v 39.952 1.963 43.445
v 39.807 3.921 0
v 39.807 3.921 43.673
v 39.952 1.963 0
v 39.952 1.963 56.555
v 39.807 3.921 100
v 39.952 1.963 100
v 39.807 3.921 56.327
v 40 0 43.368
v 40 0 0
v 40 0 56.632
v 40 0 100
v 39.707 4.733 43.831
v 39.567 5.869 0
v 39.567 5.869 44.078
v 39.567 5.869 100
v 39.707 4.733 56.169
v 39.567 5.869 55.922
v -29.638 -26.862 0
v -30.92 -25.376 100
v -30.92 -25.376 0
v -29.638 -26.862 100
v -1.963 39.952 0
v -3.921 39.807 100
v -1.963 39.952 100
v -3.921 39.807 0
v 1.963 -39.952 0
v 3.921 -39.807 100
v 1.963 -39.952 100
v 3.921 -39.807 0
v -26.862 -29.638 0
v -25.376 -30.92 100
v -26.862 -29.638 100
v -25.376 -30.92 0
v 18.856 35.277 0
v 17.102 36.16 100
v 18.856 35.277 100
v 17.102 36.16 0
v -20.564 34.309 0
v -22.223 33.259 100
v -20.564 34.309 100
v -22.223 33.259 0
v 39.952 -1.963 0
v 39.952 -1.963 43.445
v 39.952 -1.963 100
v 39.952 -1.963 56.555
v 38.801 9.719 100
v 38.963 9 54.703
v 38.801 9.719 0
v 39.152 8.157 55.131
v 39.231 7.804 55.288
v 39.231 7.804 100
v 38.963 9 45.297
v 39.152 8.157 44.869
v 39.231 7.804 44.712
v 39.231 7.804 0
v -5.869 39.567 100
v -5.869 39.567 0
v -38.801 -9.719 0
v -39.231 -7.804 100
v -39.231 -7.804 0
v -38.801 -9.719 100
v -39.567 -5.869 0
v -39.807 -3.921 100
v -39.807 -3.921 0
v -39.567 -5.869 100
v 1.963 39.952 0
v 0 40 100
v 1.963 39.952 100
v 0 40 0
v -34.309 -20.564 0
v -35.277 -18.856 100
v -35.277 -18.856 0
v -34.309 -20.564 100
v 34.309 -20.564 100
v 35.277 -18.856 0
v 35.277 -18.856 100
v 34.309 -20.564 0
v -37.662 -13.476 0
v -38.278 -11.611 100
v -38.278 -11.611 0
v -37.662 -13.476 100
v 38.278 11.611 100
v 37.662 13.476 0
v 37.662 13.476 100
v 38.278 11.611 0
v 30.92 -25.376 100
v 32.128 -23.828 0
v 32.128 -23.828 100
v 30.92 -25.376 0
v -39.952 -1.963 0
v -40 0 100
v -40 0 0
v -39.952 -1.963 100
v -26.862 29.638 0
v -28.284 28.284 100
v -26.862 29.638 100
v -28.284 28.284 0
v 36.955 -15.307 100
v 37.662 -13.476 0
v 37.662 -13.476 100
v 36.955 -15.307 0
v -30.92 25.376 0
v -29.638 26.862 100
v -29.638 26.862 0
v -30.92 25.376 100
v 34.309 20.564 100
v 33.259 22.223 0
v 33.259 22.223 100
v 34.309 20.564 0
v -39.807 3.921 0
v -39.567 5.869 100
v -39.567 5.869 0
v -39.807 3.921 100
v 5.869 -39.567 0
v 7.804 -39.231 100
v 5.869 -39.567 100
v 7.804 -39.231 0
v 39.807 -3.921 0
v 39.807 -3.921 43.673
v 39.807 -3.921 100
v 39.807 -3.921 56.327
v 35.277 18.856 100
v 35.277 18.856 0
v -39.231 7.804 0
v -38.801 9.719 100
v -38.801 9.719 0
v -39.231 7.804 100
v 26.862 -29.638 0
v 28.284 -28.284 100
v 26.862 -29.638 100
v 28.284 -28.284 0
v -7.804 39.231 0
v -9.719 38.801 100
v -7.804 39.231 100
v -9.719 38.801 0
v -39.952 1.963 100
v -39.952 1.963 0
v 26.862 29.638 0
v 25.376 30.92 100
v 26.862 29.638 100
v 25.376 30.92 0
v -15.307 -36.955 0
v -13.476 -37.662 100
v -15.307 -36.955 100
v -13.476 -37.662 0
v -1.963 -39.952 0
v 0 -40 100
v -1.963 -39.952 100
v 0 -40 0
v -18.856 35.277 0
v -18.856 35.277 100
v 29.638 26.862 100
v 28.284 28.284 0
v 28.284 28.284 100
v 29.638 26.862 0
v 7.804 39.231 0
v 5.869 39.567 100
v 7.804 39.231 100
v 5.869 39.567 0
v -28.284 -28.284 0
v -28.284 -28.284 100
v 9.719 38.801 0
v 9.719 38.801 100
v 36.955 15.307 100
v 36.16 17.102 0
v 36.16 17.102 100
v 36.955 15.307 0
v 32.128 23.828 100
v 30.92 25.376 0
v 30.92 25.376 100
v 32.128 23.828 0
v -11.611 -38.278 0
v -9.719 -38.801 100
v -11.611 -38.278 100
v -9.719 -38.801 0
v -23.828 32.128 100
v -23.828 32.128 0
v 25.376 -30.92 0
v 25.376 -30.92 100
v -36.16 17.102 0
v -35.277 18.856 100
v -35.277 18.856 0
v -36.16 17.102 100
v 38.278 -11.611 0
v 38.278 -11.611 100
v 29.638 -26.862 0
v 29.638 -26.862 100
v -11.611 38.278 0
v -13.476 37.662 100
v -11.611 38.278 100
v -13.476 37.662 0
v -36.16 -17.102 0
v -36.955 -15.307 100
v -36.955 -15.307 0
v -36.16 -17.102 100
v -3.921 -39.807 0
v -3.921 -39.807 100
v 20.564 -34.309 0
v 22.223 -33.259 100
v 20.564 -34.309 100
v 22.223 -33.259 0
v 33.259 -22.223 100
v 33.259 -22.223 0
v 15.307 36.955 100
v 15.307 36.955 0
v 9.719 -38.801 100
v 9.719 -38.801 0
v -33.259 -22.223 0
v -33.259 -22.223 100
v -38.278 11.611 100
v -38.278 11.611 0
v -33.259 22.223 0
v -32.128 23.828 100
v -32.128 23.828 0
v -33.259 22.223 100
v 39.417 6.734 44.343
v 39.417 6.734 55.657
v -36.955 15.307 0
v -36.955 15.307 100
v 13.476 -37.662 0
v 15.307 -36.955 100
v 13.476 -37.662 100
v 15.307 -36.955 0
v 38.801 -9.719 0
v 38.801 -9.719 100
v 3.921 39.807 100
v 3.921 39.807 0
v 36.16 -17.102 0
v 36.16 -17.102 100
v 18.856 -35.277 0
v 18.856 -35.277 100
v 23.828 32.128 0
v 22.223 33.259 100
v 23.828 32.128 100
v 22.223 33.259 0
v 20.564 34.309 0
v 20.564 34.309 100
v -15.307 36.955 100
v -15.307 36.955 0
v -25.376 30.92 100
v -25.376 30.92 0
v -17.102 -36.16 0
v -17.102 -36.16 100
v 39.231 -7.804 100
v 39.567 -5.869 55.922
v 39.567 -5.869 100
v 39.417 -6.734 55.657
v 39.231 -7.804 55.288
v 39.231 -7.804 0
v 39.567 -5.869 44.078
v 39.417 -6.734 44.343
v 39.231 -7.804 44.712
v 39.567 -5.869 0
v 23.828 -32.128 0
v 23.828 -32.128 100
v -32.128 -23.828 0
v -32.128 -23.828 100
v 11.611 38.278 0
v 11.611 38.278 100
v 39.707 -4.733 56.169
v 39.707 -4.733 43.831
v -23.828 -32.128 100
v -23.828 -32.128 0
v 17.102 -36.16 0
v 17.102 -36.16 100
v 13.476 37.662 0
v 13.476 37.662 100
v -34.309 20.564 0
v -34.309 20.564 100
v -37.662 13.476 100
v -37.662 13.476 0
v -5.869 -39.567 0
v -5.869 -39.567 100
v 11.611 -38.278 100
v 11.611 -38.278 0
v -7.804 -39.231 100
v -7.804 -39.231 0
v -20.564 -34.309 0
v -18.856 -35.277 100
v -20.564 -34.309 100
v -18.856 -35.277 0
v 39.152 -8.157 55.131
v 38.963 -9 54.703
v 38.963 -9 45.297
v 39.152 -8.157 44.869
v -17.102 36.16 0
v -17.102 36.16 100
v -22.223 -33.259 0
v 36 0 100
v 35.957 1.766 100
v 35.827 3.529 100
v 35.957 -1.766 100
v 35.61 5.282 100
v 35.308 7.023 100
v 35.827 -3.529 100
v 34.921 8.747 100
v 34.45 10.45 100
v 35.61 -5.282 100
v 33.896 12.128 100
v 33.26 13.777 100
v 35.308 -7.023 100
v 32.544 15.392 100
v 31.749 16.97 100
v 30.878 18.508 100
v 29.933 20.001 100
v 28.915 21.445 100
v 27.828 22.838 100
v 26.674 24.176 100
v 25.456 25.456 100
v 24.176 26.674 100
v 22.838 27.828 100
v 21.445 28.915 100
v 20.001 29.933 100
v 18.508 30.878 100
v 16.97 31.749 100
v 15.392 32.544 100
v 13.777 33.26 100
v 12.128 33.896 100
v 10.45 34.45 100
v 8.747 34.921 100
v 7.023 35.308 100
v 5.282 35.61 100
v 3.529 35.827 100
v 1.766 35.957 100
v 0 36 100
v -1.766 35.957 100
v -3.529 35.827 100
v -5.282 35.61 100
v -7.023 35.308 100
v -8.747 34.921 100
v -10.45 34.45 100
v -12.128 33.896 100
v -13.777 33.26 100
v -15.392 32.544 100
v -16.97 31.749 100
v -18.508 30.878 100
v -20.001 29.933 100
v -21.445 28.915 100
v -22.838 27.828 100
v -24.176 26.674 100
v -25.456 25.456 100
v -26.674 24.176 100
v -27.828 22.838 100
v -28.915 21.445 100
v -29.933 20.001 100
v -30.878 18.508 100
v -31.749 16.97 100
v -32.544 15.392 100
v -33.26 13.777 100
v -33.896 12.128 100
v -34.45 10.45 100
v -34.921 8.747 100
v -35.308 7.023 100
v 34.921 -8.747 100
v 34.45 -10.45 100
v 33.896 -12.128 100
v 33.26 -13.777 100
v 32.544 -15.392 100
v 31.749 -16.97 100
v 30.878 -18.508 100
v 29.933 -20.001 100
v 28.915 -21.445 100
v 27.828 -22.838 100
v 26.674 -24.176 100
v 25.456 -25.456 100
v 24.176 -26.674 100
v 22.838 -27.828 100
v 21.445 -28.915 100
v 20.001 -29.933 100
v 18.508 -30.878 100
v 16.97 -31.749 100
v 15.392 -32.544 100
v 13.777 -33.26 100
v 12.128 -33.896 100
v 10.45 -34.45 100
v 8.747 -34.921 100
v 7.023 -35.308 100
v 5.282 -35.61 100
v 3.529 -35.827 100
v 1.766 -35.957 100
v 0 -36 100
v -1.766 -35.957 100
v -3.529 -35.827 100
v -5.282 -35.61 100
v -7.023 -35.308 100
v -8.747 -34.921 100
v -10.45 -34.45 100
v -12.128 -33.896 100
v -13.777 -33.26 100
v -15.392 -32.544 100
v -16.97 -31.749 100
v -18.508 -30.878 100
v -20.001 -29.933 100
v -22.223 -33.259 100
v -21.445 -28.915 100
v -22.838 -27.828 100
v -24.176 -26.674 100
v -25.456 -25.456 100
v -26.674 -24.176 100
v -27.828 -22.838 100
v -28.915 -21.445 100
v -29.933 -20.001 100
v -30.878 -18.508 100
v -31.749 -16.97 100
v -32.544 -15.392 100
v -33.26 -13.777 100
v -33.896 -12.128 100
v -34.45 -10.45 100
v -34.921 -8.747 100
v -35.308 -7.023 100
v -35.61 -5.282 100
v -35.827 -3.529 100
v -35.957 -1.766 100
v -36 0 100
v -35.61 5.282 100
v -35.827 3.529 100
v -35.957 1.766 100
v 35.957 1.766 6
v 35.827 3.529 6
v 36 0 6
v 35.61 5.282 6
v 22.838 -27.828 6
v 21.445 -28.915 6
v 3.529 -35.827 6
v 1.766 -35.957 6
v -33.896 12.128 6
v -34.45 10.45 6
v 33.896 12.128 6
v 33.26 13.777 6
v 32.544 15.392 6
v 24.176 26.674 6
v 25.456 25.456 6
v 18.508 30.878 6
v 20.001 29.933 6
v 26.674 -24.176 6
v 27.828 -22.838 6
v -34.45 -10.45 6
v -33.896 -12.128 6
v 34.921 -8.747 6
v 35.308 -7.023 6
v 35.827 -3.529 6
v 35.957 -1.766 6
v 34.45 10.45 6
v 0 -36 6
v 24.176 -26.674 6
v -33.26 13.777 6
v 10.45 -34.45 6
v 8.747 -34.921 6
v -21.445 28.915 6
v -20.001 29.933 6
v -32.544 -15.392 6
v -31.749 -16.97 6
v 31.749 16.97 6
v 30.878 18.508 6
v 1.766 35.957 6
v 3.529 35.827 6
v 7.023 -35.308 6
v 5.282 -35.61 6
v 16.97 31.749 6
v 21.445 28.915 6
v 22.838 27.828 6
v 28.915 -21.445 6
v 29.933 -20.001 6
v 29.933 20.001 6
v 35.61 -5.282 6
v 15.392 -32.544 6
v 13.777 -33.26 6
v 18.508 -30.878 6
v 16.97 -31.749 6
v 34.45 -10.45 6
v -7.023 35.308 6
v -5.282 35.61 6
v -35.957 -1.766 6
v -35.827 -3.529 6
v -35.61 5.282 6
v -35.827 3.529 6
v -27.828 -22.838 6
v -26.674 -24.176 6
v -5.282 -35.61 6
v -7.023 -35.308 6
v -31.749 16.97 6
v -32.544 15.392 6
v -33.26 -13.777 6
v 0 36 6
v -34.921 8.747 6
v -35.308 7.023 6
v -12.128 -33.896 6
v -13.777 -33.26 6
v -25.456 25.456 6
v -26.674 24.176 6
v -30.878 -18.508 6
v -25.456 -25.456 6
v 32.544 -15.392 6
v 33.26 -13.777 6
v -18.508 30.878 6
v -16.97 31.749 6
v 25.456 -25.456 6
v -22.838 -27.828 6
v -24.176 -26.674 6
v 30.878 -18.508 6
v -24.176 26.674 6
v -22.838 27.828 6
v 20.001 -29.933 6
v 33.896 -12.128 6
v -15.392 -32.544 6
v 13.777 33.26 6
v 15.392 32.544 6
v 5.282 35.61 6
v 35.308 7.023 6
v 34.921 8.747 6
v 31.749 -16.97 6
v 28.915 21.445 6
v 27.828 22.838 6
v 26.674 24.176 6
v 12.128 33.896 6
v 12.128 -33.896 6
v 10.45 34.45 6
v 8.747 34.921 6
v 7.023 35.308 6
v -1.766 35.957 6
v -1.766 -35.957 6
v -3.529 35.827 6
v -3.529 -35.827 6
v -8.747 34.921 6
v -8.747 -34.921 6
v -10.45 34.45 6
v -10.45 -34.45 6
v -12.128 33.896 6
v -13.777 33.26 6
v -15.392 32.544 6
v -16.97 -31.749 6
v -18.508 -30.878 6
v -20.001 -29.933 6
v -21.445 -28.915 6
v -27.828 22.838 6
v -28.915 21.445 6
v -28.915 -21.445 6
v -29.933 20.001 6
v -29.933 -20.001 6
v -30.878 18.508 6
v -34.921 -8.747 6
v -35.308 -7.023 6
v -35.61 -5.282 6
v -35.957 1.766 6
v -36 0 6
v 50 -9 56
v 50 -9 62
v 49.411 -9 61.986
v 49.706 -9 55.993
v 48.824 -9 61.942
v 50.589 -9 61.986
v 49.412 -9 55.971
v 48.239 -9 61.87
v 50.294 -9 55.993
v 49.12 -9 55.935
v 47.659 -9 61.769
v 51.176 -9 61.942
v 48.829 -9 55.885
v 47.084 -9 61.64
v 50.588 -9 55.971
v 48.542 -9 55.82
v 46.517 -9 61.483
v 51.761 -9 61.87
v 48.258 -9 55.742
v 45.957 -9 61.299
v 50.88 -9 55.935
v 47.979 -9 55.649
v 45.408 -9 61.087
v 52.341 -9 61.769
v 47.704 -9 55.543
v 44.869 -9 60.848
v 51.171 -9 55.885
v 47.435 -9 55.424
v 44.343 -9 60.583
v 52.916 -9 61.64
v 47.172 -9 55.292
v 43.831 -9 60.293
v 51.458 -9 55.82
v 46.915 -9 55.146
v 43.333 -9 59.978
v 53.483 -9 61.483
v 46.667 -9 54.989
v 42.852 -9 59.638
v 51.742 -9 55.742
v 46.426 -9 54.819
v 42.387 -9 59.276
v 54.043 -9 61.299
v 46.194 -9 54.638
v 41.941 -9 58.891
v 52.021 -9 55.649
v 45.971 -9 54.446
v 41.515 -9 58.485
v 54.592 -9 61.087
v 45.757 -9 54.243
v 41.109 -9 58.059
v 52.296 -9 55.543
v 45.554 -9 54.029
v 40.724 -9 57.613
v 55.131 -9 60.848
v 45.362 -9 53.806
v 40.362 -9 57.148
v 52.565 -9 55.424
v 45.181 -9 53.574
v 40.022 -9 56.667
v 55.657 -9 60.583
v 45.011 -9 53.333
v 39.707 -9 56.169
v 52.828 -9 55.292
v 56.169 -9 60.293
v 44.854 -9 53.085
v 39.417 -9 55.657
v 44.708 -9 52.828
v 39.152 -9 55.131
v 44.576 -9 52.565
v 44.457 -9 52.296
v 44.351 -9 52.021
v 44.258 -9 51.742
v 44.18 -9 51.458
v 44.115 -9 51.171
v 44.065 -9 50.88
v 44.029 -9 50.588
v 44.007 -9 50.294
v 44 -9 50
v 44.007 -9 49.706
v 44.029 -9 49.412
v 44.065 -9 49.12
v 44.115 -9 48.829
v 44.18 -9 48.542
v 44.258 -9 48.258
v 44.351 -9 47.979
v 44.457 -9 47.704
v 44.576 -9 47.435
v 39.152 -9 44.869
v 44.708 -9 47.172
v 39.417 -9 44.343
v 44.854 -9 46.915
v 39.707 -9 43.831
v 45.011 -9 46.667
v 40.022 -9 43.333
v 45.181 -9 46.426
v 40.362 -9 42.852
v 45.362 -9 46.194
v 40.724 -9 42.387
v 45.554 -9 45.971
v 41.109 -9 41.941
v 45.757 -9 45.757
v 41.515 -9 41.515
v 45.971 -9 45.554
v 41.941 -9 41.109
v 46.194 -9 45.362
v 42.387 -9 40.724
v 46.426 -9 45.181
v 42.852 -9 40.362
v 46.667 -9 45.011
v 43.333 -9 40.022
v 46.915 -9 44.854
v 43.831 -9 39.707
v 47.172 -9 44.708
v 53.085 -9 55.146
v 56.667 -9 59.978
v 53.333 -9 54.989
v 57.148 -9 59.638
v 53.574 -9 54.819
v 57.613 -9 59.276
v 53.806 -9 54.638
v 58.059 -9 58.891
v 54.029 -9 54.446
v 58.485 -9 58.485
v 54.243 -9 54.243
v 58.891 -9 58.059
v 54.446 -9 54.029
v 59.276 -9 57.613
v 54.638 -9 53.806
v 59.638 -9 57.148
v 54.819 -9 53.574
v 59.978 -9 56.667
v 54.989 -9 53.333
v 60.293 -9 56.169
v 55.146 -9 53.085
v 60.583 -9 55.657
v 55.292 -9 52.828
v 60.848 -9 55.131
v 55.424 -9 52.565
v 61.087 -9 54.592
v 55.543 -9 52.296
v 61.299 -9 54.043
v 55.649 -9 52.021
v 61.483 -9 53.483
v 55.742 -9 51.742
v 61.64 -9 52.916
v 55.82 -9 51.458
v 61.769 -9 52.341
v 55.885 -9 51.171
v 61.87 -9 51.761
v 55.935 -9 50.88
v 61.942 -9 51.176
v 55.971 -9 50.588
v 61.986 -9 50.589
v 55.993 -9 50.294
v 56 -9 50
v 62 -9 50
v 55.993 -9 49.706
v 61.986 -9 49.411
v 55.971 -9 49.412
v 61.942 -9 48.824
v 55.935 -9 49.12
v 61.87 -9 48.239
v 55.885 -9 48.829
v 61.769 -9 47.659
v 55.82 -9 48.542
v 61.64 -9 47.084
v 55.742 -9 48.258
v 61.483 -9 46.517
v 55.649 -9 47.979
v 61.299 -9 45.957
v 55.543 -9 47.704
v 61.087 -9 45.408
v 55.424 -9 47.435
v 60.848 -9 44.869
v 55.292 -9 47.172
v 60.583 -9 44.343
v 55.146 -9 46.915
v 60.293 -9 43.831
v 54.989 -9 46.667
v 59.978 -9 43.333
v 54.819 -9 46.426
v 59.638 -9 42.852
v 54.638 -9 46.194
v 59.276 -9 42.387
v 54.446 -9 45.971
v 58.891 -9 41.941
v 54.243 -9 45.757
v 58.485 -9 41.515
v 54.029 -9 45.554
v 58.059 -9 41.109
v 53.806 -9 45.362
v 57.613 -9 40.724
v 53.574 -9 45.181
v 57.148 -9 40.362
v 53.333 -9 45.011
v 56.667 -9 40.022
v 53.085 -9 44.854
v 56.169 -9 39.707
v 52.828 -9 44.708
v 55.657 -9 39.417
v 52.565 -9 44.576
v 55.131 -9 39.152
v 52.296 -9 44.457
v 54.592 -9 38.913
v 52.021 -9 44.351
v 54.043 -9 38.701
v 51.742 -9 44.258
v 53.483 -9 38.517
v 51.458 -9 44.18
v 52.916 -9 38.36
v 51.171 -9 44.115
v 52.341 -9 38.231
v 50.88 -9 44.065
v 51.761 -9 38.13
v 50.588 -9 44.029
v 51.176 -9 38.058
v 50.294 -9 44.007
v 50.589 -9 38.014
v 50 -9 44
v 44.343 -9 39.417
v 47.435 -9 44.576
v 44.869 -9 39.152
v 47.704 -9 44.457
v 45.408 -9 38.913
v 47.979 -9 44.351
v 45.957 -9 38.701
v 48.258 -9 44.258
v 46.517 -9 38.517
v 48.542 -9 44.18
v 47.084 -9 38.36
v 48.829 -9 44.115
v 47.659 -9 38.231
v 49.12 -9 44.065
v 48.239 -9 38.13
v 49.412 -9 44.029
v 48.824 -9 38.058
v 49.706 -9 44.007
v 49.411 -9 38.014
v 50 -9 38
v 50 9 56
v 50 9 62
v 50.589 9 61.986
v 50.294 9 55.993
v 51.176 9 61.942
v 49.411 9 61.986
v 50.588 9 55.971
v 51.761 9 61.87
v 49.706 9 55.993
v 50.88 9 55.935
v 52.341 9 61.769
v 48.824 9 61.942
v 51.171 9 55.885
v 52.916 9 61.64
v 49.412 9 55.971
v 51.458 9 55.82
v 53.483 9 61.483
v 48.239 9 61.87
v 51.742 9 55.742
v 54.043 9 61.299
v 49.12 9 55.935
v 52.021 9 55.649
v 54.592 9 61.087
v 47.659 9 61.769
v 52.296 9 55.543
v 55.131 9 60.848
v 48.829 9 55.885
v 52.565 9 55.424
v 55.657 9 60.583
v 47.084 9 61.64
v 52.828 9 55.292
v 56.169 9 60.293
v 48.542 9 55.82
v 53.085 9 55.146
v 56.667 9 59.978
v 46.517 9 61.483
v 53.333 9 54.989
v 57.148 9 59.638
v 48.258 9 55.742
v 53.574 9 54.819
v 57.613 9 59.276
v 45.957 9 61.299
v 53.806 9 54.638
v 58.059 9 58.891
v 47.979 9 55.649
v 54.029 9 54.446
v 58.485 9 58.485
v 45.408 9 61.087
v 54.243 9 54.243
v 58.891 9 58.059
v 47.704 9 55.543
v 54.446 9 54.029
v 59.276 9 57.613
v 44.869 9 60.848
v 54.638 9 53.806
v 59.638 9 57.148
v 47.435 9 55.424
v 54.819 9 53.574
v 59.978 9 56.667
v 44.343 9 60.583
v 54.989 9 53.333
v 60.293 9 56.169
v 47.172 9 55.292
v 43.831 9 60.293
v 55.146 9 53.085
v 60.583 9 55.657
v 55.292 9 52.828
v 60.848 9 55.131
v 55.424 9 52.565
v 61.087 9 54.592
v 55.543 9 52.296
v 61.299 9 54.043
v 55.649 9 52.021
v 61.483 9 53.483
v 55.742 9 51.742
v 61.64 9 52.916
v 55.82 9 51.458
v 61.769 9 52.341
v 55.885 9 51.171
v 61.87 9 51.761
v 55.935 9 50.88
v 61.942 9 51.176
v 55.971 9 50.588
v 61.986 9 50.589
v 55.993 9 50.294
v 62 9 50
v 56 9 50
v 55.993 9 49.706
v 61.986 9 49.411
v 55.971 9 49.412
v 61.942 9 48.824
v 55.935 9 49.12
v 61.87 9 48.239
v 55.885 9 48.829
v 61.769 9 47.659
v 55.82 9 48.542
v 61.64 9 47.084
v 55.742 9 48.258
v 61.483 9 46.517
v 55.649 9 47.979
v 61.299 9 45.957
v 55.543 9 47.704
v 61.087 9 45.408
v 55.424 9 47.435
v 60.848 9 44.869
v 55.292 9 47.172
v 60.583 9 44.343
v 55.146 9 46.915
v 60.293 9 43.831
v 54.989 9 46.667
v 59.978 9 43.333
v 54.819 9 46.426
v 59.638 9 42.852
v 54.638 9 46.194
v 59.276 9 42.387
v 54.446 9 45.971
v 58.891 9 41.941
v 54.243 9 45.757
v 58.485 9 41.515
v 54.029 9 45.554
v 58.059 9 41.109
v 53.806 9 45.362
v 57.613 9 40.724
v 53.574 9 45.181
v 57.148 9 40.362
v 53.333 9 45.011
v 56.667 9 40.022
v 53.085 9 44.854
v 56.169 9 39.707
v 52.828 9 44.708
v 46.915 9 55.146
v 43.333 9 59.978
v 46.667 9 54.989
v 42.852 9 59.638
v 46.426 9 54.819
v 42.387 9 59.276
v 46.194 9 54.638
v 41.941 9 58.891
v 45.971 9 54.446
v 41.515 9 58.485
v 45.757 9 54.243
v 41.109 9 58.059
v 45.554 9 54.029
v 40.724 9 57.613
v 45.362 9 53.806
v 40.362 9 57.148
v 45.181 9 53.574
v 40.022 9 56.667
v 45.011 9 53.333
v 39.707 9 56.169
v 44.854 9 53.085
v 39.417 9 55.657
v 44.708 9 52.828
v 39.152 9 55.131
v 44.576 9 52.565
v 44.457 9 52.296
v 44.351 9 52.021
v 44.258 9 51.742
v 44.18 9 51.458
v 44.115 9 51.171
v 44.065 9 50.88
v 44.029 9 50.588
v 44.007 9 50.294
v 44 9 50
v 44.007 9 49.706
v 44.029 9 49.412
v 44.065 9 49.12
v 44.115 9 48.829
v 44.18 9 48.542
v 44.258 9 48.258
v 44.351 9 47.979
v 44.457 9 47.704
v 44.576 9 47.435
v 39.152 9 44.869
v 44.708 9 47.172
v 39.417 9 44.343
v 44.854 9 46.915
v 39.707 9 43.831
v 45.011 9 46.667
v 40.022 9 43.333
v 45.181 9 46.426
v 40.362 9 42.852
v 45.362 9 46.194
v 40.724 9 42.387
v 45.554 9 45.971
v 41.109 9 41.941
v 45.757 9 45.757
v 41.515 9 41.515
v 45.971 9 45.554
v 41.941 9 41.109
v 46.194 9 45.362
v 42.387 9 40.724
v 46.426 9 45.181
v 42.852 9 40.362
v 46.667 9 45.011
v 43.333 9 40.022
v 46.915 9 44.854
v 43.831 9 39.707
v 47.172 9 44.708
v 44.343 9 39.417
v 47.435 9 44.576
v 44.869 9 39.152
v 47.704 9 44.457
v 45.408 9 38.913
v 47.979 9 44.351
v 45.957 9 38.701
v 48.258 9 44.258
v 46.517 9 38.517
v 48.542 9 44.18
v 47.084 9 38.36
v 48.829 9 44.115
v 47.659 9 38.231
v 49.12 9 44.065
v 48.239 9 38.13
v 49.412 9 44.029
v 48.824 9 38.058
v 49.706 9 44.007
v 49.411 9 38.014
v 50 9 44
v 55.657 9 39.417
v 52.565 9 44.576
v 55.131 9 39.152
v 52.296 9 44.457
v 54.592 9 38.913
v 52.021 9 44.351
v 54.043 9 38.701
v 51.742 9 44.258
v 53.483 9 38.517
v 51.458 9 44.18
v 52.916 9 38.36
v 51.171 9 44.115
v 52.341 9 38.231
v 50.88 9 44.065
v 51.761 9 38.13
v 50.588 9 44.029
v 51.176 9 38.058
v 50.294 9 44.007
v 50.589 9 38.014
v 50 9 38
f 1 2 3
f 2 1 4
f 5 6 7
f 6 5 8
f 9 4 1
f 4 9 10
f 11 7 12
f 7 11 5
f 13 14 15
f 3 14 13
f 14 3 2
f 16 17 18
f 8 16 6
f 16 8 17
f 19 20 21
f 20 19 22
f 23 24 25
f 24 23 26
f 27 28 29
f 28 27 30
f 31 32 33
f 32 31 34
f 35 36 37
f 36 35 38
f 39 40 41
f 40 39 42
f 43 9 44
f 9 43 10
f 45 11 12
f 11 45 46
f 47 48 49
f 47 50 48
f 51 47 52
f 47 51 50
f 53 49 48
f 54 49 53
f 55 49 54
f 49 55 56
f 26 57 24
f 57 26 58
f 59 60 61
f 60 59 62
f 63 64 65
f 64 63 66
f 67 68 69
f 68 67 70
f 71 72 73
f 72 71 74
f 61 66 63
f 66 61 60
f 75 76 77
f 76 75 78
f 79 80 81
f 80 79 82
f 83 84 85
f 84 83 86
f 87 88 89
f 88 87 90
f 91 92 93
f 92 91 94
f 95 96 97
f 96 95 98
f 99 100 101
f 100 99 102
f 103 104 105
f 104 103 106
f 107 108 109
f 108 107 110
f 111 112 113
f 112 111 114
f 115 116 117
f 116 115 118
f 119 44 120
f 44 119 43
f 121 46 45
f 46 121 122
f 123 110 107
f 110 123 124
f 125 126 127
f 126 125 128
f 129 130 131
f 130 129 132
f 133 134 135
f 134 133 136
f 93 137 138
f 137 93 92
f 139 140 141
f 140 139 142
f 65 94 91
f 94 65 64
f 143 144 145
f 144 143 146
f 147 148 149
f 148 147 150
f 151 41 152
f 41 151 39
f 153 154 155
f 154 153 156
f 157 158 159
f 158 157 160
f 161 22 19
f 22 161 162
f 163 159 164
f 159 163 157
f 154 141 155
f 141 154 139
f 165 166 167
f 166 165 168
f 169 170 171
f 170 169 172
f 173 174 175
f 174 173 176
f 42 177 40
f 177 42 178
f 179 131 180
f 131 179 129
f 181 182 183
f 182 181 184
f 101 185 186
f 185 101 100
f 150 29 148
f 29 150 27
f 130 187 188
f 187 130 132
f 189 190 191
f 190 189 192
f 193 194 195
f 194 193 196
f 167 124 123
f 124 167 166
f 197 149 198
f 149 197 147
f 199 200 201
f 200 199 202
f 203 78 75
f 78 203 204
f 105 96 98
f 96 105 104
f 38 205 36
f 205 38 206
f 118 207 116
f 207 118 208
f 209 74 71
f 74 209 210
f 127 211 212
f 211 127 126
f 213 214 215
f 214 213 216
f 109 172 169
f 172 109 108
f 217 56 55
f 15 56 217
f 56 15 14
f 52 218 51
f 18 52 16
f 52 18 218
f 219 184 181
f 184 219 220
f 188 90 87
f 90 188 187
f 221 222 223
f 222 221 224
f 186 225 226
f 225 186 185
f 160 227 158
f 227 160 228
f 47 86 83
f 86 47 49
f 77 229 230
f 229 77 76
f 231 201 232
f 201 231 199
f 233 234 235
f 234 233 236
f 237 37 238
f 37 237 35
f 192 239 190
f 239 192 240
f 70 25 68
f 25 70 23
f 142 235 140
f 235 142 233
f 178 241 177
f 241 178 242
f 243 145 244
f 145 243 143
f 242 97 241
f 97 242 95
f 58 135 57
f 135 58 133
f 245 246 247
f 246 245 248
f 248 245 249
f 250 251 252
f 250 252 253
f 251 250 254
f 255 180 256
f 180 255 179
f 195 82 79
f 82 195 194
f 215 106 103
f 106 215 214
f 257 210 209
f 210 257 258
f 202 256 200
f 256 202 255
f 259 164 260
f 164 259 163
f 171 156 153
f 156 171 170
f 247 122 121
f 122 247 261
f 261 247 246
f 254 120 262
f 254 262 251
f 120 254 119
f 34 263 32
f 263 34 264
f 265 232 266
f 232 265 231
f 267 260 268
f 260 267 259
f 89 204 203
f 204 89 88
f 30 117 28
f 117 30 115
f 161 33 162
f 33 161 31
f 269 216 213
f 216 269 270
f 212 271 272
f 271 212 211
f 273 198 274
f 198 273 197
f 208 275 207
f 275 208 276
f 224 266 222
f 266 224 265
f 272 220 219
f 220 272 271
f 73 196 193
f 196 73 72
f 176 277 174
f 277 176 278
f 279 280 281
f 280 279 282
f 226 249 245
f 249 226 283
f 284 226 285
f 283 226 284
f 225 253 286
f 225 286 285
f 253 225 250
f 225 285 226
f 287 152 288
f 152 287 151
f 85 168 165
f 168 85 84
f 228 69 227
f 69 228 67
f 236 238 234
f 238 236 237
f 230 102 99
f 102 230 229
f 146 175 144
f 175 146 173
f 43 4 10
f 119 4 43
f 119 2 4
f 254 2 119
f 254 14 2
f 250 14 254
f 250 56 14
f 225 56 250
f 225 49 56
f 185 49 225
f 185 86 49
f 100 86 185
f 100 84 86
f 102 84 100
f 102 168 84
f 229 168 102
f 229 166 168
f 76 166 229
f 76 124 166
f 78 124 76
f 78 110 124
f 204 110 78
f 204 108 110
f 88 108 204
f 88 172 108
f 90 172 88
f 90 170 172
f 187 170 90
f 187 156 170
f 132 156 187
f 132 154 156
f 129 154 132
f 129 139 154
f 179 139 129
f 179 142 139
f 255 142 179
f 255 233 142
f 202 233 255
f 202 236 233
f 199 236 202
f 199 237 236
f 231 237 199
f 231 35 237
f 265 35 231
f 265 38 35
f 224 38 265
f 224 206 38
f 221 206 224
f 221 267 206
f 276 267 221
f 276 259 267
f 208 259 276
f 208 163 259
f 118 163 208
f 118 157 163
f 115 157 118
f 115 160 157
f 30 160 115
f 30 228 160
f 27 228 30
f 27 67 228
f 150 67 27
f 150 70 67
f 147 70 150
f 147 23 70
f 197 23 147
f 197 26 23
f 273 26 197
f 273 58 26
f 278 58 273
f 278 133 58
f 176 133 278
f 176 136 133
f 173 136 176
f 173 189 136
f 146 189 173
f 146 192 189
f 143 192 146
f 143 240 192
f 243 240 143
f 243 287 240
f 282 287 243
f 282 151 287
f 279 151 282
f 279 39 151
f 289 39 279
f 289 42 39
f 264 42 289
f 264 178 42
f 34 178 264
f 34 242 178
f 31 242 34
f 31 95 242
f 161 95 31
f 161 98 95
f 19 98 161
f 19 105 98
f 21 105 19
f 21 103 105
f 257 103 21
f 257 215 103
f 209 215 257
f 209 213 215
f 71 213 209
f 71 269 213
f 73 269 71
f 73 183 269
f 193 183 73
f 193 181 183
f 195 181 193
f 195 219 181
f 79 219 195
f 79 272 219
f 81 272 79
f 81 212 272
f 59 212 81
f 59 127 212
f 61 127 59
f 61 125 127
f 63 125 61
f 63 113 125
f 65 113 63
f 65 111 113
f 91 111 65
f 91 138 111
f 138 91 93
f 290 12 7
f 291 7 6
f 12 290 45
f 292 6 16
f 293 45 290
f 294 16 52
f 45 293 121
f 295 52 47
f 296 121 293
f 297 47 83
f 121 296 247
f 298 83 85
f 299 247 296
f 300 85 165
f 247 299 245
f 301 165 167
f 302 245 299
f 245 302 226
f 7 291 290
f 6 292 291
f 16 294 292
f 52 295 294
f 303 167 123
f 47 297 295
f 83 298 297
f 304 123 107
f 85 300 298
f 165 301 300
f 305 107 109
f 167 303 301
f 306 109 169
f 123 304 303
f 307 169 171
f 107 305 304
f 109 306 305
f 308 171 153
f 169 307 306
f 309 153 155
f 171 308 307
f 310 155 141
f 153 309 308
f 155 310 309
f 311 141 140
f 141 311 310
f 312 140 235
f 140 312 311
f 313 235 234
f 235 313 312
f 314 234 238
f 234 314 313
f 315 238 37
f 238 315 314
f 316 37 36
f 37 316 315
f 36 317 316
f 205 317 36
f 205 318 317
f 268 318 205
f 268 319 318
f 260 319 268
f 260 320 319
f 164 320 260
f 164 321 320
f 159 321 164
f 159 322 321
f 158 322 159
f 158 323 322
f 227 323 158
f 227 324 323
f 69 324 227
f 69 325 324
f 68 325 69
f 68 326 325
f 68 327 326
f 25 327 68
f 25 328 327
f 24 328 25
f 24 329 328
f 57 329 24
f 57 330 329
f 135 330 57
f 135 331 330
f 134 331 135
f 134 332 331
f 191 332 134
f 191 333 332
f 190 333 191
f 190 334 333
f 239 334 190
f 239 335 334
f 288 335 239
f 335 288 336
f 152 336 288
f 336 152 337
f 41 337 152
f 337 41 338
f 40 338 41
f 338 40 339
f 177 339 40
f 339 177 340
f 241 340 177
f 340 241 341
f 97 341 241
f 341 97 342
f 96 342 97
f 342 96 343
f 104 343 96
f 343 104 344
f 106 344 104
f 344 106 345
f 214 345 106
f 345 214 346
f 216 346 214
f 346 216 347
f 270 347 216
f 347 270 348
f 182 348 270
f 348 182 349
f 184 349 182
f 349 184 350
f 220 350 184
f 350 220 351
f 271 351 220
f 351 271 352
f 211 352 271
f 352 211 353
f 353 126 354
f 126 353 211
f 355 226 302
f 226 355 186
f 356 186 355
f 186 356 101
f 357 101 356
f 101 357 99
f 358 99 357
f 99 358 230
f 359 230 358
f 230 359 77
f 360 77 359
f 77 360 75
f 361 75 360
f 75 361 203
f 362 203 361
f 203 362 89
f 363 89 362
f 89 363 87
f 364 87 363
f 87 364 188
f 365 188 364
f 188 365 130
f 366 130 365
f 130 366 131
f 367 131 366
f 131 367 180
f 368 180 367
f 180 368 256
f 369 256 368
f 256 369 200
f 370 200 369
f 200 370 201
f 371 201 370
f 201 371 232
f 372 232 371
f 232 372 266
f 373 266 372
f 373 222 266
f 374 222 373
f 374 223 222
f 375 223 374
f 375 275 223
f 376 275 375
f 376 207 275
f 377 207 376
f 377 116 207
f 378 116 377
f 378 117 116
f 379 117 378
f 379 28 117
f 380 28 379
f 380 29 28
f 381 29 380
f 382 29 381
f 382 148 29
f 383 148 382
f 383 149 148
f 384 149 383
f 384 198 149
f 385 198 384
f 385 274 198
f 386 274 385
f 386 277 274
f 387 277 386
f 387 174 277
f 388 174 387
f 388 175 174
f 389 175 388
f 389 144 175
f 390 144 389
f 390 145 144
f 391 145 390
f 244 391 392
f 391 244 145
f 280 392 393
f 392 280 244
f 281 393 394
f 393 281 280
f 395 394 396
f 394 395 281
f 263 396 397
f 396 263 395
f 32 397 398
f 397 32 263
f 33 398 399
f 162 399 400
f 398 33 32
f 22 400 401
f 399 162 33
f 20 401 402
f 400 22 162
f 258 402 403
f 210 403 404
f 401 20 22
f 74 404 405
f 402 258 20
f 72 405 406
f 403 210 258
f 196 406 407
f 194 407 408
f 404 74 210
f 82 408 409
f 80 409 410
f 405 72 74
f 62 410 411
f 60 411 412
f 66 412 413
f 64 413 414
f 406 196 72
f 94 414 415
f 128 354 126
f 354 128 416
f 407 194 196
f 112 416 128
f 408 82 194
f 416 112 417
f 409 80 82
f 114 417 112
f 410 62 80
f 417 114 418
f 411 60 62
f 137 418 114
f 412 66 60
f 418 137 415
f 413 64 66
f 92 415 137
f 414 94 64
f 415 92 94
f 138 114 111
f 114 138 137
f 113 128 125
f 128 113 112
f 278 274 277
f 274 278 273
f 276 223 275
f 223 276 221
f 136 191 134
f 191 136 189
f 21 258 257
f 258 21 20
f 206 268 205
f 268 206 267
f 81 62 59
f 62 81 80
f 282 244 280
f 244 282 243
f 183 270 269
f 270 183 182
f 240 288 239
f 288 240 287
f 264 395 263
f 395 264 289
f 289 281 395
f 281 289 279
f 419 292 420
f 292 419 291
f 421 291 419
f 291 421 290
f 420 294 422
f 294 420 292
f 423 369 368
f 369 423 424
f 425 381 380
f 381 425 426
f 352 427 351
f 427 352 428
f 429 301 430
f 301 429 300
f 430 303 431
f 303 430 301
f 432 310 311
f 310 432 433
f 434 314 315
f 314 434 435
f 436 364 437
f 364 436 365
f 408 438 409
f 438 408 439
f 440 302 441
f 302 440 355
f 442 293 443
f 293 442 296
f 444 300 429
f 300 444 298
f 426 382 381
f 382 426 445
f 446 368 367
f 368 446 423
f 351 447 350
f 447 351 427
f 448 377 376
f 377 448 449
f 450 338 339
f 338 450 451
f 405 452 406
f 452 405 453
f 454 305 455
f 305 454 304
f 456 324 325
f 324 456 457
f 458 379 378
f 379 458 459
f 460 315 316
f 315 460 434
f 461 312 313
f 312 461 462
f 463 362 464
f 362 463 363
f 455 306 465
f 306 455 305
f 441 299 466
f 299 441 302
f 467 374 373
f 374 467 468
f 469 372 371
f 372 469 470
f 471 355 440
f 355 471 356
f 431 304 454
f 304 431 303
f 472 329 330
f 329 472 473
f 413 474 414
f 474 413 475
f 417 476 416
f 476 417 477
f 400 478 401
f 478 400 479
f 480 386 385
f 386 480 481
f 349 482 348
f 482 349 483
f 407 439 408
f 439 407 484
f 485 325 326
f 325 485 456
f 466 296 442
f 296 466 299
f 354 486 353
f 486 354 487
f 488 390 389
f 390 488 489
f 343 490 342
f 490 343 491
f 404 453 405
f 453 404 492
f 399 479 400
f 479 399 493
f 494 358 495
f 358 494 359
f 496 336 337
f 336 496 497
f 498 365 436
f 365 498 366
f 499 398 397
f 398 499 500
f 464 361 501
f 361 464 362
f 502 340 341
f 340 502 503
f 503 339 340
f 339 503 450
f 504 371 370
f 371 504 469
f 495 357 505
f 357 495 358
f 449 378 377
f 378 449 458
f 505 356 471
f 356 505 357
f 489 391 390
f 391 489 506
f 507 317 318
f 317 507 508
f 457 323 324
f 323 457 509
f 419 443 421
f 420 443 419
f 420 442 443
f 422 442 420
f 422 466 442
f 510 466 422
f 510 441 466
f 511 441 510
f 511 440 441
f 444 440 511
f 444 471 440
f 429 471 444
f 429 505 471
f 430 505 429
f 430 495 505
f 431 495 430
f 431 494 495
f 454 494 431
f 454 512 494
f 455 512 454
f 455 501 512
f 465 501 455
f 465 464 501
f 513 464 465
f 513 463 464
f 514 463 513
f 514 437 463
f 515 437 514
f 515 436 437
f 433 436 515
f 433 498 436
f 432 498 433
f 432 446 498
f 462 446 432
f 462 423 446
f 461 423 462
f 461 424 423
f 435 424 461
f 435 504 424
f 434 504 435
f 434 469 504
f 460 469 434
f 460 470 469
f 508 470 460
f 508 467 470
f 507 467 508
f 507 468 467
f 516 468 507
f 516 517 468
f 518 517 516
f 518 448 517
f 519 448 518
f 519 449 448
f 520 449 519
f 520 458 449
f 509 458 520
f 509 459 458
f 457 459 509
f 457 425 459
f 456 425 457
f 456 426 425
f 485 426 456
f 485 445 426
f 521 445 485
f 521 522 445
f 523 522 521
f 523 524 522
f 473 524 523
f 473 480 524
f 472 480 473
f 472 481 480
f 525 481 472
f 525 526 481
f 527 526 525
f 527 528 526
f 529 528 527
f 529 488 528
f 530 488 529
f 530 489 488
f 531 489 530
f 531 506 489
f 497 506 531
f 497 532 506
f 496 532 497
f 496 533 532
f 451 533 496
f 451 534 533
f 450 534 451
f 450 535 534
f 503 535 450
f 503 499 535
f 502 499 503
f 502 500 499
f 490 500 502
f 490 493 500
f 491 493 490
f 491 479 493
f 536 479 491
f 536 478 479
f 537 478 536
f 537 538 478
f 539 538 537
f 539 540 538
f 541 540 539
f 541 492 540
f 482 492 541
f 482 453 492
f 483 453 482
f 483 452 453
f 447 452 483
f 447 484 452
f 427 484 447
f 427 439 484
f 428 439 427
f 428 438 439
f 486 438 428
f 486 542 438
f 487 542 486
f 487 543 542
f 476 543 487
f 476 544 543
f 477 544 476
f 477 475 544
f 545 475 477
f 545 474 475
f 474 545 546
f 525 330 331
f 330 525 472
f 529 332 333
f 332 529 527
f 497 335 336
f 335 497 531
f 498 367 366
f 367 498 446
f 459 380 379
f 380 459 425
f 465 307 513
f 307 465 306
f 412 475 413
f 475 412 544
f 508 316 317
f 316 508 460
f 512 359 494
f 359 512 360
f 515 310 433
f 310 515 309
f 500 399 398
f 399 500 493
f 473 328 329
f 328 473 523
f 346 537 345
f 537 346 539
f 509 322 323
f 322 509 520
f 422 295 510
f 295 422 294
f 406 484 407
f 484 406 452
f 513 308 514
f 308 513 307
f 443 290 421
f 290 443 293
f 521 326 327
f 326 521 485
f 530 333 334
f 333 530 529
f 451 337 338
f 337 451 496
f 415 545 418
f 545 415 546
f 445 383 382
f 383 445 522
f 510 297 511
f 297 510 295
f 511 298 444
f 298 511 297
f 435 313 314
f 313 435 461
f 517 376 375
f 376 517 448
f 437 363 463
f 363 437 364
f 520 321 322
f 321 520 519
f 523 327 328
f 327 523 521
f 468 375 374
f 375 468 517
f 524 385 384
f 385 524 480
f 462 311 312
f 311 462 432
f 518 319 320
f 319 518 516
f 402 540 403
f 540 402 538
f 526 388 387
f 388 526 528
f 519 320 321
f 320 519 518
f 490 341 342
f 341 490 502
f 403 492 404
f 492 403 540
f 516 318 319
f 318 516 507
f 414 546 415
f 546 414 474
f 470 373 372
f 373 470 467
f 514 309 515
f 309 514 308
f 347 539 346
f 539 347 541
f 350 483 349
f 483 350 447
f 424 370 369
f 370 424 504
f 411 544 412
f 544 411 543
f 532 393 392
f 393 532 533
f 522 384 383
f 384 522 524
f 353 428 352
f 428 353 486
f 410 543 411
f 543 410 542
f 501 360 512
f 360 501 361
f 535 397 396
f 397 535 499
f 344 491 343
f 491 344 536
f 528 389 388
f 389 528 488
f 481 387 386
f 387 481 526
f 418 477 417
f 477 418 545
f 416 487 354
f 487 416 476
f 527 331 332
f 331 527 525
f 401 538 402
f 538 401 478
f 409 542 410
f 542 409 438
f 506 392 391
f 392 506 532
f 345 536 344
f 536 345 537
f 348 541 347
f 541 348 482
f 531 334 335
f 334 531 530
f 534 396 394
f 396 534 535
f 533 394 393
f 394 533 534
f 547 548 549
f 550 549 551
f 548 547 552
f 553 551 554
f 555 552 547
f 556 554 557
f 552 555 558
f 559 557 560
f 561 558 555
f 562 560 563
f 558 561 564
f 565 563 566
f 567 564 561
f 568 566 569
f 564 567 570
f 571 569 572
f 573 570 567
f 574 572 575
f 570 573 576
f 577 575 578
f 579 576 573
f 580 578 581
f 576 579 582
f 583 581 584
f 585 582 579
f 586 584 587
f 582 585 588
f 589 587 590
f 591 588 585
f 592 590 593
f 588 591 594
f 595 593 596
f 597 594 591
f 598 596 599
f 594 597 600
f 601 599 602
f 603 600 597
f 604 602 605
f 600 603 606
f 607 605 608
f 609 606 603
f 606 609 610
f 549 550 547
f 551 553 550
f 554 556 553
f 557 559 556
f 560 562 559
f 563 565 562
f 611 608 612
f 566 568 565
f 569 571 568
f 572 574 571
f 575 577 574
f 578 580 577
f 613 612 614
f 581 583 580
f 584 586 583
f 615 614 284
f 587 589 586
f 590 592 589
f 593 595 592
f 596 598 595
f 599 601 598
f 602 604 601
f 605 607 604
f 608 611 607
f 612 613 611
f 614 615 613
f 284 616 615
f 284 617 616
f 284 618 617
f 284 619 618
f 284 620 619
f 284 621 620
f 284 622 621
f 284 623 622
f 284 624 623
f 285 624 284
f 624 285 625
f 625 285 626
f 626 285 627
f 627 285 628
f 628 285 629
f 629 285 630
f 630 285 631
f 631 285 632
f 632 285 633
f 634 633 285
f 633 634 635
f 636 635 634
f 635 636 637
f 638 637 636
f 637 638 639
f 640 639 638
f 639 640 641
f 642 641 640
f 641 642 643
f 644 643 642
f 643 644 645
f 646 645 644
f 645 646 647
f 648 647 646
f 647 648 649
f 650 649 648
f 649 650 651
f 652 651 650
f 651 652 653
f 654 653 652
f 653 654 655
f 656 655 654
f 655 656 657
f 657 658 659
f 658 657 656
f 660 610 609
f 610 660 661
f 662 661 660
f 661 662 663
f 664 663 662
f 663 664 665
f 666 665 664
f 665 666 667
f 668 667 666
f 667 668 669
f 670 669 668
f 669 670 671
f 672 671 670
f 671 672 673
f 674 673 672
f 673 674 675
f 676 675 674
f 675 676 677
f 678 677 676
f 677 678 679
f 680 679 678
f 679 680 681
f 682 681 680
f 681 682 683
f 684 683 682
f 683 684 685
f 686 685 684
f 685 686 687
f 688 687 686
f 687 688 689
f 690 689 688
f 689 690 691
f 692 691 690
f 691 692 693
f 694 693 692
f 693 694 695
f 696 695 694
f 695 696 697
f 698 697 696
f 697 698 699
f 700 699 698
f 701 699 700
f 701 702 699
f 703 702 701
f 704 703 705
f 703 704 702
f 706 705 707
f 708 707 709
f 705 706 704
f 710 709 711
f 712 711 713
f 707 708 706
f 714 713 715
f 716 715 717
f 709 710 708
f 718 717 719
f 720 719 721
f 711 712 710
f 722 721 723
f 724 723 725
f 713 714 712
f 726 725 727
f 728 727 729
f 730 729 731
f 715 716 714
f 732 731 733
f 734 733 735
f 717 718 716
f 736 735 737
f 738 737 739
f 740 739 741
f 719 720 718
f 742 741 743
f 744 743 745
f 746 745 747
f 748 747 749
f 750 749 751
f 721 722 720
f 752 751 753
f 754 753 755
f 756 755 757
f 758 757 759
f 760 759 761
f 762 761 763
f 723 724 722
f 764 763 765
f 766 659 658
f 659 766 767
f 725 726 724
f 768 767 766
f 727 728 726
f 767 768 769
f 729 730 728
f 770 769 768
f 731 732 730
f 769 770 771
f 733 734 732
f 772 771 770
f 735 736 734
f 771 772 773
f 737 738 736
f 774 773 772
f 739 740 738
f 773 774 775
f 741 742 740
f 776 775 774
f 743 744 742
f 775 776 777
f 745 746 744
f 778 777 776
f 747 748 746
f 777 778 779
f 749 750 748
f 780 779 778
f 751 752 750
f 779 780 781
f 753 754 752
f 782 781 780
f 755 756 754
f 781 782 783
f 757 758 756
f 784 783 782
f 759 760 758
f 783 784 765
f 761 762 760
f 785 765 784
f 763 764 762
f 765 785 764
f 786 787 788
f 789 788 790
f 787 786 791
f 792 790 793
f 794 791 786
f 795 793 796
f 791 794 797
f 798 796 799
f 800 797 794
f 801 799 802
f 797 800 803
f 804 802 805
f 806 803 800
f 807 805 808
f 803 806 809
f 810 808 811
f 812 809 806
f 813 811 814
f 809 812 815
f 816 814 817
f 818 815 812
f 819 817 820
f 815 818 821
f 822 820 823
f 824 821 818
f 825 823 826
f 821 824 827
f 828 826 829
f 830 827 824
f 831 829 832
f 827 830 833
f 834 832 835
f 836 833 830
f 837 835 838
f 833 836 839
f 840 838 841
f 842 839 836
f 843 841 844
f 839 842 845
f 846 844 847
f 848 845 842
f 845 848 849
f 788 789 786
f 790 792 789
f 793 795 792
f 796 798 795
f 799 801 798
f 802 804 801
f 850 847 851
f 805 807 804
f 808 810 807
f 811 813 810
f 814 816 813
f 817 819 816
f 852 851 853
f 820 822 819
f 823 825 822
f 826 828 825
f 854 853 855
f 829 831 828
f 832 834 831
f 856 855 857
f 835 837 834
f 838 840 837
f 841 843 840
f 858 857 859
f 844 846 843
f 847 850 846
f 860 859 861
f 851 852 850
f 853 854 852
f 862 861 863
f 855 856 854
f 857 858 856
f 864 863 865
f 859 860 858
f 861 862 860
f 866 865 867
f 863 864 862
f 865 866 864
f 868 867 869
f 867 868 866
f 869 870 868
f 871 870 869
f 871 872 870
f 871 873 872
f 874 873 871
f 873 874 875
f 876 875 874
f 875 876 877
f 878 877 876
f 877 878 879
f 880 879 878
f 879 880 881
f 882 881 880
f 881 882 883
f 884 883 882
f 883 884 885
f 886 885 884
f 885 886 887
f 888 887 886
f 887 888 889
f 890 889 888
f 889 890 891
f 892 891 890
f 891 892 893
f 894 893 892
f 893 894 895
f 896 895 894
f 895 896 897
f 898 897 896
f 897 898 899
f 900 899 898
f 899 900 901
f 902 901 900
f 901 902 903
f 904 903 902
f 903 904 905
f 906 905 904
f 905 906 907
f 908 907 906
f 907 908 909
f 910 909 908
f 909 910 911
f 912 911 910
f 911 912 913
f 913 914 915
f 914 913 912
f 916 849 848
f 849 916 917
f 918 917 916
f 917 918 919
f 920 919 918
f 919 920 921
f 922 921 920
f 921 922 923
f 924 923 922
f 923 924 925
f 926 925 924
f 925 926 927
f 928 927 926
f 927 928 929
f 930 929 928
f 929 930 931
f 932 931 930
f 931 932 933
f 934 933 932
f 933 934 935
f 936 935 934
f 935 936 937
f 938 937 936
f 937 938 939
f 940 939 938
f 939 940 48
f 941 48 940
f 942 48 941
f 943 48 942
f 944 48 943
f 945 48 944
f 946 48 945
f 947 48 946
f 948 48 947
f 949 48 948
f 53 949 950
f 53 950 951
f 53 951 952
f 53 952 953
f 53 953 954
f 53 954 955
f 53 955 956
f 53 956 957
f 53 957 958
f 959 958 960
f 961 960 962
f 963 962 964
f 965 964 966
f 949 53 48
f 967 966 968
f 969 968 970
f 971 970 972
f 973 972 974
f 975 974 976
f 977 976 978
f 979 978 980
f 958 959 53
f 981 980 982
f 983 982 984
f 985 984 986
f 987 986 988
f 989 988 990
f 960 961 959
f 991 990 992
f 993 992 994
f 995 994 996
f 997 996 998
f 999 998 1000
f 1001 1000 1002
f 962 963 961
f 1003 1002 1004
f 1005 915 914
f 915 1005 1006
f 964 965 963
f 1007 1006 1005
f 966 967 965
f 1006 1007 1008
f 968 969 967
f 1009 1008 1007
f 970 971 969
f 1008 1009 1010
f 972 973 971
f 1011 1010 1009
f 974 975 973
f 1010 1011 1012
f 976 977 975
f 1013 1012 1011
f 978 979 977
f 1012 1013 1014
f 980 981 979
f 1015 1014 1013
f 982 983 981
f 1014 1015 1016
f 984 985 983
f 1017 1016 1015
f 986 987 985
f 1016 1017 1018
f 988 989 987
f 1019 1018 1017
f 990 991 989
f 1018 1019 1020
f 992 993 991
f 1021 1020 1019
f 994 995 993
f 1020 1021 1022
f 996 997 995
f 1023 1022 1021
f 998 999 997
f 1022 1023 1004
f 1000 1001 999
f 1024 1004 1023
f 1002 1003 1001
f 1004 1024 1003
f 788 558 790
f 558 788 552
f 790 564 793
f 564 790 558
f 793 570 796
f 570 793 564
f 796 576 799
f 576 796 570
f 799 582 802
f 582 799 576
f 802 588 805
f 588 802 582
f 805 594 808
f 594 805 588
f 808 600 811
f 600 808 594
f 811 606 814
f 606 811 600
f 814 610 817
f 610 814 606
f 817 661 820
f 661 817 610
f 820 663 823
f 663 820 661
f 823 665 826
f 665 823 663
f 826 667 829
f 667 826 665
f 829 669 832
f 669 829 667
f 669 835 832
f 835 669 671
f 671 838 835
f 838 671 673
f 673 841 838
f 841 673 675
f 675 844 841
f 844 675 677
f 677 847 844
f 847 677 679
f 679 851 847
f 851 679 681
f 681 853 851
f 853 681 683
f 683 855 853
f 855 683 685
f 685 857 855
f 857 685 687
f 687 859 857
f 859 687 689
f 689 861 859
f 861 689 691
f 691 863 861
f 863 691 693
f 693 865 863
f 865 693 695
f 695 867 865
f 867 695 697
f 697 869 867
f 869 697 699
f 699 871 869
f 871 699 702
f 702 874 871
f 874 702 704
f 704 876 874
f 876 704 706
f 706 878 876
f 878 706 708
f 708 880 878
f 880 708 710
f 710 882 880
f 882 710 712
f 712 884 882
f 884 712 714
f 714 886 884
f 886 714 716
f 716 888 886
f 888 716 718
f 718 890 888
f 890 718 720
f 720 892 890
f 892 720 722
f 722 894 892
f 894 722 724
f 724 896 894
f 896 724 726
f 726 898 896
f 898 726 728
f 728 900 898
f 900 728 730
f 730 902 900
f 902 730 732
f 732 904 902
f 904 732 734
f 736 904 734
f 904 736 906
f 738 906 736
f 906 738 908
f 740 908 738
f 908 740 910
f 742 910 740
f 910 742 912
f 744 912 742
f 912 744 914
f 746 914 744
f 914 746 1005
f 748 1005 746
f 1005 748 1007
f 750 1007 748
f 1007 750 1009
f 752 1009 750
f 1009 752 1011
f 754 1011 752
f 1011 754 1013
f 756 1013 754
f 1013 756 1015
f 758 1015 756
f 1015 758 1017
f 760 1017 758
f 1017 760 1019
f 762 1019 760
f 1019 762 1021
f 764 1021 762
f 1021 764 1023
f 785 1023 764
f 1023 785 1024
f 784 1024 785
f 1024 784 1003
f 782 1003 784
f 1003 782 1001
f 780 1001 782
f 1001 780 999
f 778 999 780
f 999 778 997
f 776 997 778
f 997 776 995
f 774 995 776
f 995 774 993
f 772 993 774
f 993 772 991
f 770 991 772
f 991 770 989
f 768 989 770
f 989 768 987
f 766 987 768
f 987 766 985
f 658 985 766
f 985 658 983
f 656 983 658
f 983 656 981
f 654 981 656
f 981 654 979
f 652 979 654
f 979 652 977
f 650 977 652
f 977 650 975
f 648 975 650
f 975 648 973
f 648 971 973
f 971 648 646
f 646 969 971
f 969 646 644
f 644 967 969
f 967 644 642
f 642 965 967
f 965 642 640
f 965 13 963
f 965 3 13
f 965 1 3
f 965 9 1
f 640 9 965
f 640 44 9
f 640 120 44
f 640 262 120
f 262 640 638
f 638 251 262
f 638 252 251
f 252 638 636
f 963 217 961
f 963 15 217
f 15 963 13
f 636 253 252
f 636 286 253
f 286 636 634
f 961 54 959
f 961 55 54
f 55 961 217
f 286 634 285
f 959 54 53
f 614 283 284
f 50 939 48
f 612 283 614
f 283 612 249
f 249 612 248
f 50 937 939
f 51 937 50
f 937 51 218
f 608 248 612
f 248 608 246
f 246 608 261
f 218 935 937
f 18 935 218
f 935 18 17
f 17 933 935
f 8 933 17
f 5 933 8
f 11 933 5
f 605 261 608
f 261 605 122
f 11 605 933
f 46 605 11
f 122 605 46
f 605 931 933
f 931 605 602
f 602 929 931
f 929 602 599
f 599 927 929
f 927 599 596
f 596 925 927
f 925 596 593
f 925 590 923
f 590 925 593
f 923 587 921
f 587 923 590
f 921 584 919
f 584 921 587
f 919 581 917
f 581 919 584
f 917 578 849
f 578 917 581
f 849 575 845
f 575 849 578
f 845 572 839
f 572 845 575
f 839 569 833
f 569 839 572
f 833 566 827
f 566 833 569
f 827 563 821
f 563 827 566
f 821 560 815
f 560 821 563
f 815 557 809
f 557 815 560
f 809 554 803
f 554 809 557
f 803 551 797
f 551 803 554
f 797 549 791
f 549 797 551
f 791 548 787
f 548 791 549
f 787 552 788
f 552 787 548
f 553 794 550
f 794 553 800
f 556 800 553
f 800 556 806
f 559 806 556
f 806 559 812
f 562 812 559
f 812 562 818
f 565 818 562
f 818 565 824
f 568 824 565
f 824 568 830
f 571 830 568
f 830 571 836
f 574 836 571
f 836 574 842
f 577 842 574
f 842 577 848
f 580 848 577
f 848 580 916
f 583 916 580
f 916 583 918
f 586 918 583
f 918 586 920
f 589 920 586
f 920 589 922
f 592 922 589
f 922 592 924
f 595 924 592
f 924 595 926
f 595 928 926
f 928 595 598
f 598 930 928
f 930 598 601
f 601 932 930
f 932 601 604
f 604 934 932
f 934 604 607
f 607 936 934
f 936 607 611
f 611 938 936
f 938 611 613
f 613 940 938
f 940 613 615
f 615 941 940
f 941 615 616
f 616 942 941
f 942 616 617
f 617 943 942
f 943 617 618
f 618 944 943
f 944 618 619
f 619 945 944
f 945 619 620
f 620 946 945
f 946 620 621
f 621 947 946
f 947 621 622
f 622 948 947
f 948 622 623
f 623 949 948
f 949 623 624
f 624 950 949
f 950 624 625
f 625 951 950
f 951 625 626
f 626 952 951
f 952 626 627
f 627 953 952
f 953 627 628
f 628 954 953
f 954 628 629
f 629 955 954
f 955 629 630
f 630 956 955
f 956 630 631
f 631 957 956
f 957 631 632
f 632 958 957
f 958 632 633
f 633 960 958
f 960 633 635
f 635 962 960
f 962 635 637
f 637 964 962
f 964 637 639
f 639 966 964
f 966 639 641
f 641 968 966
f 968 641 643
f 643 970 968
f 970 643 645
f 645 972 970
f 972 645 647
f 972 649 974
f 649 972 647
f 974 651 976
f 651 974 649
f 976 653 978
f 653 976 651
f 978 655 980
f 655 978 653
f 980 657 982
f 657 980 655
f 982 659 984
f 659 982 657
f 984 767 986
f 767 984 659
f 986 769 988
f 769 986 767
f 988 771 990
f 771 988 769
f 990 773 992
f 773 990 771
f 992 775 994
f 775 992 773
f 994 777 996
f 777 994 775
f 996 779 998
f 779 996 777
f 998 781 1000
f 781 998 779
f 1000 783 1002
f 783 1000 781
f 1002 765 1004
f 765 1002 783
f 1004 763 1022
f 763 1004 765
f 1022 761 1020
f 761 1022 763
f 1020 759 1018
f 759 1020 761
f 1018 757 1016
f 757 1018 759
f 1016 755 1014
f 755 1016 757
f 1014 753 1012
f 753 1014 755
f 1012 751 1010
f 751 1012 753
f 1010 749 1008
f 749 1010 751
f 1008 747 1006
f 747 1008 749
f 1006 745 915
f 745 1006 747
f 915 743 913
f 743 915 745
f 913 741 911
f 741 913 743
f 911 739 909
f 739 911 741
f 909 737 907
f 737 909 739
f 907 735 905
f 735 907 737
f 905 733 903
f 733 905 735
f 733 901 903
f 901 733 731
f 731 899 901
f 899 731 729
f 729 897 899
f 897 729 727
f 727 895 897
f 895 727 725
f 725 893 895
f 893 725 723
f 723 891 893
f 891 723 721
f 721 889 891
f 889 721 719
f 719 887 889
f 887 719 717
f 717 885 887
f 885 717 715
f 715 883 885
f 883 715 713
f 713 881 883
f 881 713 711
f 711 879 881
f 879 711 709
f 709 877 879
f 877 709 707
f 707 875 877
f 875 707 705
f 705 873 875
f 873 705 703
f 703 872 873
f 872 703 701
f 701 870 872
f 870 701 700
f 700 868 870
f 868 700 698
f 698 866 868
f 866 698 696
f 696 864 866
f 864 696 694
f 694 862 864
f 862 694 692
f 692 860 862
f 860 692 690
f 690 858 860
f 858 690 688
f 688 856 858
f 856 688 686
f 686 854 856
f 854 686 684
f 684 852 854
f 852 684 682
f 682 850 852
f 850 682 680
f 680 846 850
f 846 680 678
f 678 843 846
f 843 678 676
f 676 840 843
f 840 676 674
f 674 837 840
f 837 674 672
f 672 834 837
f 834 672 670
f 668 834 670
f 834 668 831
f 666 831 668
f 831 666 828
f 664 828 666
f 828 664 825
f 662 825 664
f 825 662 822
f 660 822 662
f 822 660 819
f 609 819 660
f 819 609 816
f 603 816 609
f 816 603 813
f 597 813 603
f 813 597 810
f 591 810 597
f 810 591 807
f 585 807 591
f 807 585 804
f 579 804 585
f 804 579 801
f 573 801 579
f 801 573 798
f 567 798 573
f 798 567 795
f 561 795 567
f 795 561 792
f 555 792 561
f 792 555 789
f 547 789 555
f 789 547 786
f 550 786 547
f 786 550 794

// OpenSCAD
$fn = 128;

mug_outer_d = 80;
mug_height = 100;
wall_thickness = 4;
bottom_thickness = 6;

handle_ring_outer = 12;
handle_ring_inner = 6;
handle_depth = 18;
handle_overlap = 2;
handle_offset = mug_outer_d/2 + handle_ring_outer - handle_overlap;

module mug_body() {
    difference() {
        cylinder(h = mug_height, r = mug_outer_d/2);
        translate([0, 0, bottom_thickness])
            cylinder(h = mug_height - bottom_thickness + 0.1, r = mug_outer_d/2 - wall_thickness);
    }
}

module ring_handle() {
    translate([handle_offset, 0, mug_height/2])
        rotate([-90, 0, 0])
            linear_extrude(height = handle_depth, center = true, convexity = 10)
                difference() {
                    circle(r = handle_ring_outer);
                    circle(r = handle_ring_inner);
                }
}

union() {
    mug_body();
    ring_handle();
}
